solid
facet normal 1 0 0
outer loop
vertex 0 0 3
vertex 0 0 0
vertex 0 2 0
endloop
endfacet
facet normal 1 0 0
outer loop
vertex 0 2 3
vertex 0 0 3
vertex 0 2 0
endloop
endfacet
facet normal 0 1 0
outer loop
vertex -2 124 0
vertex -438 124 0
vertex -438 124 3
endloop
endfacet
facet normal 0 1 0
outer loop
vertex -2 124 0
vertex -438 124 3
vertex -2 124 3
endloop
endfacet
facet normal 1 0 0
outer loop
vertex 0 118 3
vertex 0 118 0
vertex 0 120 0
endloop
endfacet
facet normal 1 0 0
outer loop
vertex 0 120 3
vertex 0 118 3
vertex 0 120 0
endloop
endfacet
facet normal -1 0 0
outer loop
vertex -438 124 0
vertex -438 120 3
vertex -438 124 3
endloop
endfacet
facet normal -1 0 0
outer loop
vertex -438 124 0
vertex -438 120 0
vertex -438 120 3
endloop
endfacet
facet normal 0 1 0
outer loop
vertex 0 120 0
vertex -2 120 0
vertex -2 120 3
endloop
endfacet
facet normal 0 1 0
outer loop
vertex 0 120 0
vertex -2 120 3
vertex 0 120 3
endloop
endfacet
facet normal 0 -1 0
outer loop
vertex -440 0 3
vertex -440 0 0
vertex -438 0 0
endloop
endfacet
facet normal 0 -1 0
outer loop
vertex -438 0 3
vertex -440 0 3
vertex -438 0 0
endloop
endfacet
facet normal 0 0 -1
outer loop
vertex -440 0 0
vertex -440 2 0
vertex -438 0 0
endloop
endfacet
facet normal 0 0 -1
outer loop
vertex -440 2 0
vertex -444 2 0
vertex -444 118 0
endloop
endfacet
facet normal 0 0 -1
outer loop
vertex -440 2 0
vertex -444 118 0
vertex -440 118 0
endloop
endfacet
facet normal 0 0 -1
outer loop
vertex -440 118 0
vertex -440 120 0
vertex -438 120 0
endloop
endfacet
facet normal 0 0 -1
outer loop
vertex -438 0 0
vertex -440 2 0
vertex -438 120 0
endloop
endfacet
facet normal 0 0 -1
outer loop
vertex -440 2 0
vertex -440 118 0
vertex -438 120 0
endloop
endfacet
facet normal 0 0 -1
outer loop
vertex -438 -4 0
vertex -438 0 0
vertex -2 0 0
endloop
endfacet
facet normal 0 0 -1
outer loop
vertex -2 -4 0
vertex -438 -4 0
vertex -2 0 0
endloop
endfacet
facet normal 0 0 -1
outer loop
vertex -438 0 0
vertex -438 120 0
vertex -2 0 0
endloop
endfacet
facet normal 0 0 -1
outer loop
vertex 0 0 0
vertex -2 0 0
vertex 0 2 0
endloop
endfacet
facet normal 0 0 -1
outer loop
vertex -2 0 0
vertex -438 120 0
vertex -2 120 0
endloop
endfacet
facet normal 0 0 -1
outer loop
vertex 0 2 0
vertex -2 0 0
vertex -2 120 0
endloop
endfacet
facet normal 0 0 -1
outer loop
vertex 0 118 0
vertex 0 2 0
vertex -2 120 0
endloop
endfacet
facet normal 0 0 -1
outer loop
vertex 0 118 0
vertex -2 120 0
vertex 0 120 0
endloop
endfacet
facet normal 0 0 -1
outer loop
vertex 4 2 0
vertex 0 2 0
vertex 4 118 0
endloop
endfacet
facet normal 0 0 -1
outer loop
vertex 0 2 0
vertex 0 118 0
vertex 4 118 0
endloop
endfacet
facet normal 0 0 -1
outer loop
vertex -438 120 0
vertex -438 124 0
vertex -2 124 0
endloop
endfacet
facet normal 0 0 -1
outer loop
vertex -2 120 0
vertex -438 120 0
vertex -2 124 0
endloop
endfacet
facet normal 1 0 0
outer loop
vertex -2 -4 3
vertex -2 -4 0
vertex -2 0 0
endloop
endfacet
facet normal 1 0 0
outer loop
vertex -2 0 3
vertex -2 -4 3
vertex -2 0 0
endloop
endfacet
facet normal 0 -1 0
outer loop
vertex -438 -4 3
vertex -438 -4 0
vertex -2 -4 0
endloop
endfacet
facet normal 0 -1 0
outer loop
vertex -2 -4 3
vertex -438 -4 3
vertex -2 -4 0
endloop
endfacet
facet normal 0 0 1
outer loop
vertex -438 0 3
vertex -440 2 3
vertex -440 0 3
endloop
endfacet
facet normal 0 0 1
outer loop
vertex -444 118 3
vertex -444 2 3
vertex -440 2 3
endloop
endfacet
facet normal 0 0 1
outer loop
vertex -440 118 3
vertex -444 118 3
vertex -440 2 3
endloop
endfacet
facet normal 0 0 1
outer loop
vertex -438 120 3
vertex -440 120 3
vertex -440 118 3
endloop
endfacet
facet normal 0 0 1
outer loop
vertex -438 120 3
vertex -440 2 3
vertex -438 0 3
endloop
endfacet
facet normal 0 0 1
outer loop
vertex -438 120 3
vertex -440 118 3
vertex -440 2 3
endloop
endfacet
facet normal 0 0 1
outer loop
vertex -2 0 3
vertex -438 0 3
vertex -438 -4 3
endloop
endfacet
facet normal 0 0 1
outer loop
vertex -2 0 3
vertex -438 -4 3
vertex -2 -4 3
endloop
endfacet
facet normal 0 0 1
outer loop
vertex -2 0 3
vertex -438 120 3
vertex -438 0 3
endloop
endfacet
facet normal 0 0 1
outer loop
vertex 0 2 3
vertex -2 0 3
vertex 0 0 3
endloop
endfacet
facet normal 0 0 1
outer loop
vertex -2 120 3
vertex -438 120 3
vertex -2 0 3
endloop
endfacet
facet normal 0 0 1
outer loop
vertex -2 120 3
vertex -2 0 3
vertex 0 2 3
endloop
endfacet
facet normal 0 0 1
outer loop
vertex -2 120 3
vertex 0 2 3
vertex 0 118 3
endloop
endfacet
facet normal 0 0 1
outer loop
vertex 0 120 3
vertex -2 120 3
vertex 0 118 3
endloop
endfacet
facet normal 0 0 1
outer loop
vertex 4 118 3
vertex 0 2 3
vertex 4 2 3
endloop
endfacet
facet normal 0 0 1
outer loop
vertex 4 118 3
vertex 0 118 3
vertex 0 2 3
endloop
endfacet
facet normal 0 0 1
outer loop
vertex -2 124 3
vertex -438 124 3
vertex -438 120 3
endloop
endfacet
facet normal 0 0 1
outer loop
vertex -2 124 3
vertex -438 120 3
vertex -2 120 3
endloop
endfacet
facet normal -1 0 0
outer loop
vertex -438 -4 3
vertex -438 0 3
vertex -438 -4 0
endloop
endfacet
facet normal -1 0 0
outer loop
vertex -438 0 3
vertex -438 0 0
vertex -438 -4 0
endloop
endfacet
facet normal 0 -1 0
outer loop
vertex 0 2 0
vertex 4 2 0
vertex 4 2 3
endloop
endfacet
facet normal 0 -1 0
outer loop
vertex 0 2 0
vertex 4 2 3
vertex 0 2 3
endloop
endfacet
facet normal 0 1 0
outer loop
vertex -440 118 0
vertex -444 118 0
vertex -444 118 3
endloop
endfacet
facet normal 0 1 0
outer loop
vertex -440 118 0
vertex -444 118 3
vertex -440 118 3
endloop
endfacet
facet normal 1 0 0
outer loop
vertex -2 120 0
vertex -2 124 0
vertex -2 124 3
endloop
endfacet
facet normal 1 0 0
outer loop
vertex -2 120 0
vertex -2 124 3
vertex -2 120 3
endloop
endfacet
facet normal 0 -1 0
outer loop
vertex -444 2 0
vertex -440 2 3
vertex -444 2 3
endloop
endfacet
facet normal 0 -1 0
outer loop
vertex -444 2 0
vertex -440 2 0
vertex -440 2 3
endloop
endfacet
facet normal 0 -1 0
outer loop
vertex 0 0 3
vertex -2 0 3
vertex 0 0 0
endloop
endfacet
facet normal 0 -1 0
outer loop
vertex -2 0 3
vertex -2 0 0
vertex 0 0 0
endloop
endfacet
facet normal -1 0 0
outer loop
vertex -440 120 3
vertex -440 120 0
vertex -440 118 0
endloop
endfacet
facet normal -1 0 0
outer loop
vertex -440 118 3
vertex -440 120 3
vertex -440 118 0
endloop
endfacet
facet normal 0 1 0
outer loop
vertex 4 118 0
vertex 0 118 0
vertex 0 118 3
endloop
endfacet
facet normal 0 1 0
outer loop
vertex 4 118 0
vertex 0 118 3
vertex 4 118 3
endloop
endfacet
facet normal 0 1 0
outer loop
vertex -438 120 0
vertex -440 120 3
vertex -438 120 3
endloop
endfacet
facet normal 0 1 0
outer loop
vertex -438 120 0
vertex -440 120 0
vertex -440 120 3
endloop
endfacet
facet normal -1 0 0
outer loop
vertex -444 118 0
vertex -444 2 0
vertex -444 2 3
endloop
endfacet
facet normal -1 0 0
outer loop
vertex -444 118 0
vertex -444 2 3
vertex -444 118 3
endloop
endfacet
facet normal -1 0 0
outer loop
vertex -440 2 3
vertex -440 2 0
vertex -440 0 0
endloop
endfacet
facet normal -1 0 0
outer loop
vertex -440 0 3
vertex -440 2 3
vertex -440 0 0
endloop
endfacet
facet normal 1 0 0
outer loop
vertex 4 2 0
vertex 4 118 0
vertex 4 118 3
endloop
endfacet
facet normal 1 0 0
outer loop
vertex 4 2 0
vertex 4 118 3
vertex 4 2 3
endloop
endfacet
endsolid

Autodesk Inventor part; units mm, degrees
ref_plane "YZ Plane" through (0, 0, 0) normal (1, 0, 0) x (0, 1, 0)
ref_plane "XZ Plane" through (0, 0, 0) normal (0, 1, 0) x (-1, 0, 0)
ref_plane "XY Plane" through (0, 0, 0) normal (0, 0, 1) x (1, 0, 0)
sketch "Sketch1" plane through (0, 0, 0) normal (0, 0, 1) x (1, 0, 0)
  line L0 (0, 0) -> (6, 0) projected
  line L1 (6, 0) -> (6, 120) projected
  line L2 (0, 120) -> (6, 120) projected
  line L3 (0, 0) -> (0, 120) projected
  line L4 (0, -6) -> (-440, -6) projected
  line L5 (0, -6) -> (0, 0) projected
  line L6 (-440, 0) -> (0, 0) projected
  line L7 (-440, -6) -> (-440, 0) projected
  line L8 (0, 126) -> (-440, 126) projected
  line L9 (-440, 126) -> (-440, 120) projected
  line L10 (-440, 120) -> (0, 120) projected
  line L11 (0, 120) -> (0, 126) projected
  line L12 (-446, 120) -> (-440, 120) projected
  line L13 (-440, 120) -> (-440, 0) projected
  line L14 (-446, 0) -> (-440, 0) projected
  line L15 (-446, 120) -> (-446, 0) projected
  line L16 (0, 120) -> (-440, 120)
  line L17 (-440, 120) -> (-440, 0)
  line L18 (-440, 0) -> (0, 0)
  line L19 (0, 0) -> (0, 120)
  line L20 (0, 118) -> (4, 118)
  line L21 (4, 118) -> (4, 2)
  line L22 (4, 2) -> (0, 2)
  line L23 (-438, 120) -> (-438, 124)
  line L24 (-438, 124) -> (-2, 124)
  line L25 (-2, 124) -> (-2, 120)
  line L26 (-438, 0) -> (-438, -4)
  line L27 (-438, -4) -> (-2, -4)
  line L28 (-2, -4) -> (-2, 0)
  line L29 (-440, 2) -> (-444, 2)
  line L30 (-444, 2) -> (-444, 118)
  line L31 (-444, 118) -> (-440, 118)
  point P0 (-456.0051, 134.3667)
  point P1 (-456.0051, 4.3667)
  point P2 (-6.0051, 134.3667)
  point P3 (-2, 0)
  dimension "d3" = 2
  dimension "d4" = 2
  dimension "d5" = 2
  dimension "d6" = 2
extrude "Extrusion1" add sketch "Sketch1" along normal blind 3 contours L6 L13 L10 L3 | L3 L20 L21 L22 | L28 L27 L26 L6 | L10 L23 L24 L25 | L29 L30 L31 L13
properties part number "ypanel"
